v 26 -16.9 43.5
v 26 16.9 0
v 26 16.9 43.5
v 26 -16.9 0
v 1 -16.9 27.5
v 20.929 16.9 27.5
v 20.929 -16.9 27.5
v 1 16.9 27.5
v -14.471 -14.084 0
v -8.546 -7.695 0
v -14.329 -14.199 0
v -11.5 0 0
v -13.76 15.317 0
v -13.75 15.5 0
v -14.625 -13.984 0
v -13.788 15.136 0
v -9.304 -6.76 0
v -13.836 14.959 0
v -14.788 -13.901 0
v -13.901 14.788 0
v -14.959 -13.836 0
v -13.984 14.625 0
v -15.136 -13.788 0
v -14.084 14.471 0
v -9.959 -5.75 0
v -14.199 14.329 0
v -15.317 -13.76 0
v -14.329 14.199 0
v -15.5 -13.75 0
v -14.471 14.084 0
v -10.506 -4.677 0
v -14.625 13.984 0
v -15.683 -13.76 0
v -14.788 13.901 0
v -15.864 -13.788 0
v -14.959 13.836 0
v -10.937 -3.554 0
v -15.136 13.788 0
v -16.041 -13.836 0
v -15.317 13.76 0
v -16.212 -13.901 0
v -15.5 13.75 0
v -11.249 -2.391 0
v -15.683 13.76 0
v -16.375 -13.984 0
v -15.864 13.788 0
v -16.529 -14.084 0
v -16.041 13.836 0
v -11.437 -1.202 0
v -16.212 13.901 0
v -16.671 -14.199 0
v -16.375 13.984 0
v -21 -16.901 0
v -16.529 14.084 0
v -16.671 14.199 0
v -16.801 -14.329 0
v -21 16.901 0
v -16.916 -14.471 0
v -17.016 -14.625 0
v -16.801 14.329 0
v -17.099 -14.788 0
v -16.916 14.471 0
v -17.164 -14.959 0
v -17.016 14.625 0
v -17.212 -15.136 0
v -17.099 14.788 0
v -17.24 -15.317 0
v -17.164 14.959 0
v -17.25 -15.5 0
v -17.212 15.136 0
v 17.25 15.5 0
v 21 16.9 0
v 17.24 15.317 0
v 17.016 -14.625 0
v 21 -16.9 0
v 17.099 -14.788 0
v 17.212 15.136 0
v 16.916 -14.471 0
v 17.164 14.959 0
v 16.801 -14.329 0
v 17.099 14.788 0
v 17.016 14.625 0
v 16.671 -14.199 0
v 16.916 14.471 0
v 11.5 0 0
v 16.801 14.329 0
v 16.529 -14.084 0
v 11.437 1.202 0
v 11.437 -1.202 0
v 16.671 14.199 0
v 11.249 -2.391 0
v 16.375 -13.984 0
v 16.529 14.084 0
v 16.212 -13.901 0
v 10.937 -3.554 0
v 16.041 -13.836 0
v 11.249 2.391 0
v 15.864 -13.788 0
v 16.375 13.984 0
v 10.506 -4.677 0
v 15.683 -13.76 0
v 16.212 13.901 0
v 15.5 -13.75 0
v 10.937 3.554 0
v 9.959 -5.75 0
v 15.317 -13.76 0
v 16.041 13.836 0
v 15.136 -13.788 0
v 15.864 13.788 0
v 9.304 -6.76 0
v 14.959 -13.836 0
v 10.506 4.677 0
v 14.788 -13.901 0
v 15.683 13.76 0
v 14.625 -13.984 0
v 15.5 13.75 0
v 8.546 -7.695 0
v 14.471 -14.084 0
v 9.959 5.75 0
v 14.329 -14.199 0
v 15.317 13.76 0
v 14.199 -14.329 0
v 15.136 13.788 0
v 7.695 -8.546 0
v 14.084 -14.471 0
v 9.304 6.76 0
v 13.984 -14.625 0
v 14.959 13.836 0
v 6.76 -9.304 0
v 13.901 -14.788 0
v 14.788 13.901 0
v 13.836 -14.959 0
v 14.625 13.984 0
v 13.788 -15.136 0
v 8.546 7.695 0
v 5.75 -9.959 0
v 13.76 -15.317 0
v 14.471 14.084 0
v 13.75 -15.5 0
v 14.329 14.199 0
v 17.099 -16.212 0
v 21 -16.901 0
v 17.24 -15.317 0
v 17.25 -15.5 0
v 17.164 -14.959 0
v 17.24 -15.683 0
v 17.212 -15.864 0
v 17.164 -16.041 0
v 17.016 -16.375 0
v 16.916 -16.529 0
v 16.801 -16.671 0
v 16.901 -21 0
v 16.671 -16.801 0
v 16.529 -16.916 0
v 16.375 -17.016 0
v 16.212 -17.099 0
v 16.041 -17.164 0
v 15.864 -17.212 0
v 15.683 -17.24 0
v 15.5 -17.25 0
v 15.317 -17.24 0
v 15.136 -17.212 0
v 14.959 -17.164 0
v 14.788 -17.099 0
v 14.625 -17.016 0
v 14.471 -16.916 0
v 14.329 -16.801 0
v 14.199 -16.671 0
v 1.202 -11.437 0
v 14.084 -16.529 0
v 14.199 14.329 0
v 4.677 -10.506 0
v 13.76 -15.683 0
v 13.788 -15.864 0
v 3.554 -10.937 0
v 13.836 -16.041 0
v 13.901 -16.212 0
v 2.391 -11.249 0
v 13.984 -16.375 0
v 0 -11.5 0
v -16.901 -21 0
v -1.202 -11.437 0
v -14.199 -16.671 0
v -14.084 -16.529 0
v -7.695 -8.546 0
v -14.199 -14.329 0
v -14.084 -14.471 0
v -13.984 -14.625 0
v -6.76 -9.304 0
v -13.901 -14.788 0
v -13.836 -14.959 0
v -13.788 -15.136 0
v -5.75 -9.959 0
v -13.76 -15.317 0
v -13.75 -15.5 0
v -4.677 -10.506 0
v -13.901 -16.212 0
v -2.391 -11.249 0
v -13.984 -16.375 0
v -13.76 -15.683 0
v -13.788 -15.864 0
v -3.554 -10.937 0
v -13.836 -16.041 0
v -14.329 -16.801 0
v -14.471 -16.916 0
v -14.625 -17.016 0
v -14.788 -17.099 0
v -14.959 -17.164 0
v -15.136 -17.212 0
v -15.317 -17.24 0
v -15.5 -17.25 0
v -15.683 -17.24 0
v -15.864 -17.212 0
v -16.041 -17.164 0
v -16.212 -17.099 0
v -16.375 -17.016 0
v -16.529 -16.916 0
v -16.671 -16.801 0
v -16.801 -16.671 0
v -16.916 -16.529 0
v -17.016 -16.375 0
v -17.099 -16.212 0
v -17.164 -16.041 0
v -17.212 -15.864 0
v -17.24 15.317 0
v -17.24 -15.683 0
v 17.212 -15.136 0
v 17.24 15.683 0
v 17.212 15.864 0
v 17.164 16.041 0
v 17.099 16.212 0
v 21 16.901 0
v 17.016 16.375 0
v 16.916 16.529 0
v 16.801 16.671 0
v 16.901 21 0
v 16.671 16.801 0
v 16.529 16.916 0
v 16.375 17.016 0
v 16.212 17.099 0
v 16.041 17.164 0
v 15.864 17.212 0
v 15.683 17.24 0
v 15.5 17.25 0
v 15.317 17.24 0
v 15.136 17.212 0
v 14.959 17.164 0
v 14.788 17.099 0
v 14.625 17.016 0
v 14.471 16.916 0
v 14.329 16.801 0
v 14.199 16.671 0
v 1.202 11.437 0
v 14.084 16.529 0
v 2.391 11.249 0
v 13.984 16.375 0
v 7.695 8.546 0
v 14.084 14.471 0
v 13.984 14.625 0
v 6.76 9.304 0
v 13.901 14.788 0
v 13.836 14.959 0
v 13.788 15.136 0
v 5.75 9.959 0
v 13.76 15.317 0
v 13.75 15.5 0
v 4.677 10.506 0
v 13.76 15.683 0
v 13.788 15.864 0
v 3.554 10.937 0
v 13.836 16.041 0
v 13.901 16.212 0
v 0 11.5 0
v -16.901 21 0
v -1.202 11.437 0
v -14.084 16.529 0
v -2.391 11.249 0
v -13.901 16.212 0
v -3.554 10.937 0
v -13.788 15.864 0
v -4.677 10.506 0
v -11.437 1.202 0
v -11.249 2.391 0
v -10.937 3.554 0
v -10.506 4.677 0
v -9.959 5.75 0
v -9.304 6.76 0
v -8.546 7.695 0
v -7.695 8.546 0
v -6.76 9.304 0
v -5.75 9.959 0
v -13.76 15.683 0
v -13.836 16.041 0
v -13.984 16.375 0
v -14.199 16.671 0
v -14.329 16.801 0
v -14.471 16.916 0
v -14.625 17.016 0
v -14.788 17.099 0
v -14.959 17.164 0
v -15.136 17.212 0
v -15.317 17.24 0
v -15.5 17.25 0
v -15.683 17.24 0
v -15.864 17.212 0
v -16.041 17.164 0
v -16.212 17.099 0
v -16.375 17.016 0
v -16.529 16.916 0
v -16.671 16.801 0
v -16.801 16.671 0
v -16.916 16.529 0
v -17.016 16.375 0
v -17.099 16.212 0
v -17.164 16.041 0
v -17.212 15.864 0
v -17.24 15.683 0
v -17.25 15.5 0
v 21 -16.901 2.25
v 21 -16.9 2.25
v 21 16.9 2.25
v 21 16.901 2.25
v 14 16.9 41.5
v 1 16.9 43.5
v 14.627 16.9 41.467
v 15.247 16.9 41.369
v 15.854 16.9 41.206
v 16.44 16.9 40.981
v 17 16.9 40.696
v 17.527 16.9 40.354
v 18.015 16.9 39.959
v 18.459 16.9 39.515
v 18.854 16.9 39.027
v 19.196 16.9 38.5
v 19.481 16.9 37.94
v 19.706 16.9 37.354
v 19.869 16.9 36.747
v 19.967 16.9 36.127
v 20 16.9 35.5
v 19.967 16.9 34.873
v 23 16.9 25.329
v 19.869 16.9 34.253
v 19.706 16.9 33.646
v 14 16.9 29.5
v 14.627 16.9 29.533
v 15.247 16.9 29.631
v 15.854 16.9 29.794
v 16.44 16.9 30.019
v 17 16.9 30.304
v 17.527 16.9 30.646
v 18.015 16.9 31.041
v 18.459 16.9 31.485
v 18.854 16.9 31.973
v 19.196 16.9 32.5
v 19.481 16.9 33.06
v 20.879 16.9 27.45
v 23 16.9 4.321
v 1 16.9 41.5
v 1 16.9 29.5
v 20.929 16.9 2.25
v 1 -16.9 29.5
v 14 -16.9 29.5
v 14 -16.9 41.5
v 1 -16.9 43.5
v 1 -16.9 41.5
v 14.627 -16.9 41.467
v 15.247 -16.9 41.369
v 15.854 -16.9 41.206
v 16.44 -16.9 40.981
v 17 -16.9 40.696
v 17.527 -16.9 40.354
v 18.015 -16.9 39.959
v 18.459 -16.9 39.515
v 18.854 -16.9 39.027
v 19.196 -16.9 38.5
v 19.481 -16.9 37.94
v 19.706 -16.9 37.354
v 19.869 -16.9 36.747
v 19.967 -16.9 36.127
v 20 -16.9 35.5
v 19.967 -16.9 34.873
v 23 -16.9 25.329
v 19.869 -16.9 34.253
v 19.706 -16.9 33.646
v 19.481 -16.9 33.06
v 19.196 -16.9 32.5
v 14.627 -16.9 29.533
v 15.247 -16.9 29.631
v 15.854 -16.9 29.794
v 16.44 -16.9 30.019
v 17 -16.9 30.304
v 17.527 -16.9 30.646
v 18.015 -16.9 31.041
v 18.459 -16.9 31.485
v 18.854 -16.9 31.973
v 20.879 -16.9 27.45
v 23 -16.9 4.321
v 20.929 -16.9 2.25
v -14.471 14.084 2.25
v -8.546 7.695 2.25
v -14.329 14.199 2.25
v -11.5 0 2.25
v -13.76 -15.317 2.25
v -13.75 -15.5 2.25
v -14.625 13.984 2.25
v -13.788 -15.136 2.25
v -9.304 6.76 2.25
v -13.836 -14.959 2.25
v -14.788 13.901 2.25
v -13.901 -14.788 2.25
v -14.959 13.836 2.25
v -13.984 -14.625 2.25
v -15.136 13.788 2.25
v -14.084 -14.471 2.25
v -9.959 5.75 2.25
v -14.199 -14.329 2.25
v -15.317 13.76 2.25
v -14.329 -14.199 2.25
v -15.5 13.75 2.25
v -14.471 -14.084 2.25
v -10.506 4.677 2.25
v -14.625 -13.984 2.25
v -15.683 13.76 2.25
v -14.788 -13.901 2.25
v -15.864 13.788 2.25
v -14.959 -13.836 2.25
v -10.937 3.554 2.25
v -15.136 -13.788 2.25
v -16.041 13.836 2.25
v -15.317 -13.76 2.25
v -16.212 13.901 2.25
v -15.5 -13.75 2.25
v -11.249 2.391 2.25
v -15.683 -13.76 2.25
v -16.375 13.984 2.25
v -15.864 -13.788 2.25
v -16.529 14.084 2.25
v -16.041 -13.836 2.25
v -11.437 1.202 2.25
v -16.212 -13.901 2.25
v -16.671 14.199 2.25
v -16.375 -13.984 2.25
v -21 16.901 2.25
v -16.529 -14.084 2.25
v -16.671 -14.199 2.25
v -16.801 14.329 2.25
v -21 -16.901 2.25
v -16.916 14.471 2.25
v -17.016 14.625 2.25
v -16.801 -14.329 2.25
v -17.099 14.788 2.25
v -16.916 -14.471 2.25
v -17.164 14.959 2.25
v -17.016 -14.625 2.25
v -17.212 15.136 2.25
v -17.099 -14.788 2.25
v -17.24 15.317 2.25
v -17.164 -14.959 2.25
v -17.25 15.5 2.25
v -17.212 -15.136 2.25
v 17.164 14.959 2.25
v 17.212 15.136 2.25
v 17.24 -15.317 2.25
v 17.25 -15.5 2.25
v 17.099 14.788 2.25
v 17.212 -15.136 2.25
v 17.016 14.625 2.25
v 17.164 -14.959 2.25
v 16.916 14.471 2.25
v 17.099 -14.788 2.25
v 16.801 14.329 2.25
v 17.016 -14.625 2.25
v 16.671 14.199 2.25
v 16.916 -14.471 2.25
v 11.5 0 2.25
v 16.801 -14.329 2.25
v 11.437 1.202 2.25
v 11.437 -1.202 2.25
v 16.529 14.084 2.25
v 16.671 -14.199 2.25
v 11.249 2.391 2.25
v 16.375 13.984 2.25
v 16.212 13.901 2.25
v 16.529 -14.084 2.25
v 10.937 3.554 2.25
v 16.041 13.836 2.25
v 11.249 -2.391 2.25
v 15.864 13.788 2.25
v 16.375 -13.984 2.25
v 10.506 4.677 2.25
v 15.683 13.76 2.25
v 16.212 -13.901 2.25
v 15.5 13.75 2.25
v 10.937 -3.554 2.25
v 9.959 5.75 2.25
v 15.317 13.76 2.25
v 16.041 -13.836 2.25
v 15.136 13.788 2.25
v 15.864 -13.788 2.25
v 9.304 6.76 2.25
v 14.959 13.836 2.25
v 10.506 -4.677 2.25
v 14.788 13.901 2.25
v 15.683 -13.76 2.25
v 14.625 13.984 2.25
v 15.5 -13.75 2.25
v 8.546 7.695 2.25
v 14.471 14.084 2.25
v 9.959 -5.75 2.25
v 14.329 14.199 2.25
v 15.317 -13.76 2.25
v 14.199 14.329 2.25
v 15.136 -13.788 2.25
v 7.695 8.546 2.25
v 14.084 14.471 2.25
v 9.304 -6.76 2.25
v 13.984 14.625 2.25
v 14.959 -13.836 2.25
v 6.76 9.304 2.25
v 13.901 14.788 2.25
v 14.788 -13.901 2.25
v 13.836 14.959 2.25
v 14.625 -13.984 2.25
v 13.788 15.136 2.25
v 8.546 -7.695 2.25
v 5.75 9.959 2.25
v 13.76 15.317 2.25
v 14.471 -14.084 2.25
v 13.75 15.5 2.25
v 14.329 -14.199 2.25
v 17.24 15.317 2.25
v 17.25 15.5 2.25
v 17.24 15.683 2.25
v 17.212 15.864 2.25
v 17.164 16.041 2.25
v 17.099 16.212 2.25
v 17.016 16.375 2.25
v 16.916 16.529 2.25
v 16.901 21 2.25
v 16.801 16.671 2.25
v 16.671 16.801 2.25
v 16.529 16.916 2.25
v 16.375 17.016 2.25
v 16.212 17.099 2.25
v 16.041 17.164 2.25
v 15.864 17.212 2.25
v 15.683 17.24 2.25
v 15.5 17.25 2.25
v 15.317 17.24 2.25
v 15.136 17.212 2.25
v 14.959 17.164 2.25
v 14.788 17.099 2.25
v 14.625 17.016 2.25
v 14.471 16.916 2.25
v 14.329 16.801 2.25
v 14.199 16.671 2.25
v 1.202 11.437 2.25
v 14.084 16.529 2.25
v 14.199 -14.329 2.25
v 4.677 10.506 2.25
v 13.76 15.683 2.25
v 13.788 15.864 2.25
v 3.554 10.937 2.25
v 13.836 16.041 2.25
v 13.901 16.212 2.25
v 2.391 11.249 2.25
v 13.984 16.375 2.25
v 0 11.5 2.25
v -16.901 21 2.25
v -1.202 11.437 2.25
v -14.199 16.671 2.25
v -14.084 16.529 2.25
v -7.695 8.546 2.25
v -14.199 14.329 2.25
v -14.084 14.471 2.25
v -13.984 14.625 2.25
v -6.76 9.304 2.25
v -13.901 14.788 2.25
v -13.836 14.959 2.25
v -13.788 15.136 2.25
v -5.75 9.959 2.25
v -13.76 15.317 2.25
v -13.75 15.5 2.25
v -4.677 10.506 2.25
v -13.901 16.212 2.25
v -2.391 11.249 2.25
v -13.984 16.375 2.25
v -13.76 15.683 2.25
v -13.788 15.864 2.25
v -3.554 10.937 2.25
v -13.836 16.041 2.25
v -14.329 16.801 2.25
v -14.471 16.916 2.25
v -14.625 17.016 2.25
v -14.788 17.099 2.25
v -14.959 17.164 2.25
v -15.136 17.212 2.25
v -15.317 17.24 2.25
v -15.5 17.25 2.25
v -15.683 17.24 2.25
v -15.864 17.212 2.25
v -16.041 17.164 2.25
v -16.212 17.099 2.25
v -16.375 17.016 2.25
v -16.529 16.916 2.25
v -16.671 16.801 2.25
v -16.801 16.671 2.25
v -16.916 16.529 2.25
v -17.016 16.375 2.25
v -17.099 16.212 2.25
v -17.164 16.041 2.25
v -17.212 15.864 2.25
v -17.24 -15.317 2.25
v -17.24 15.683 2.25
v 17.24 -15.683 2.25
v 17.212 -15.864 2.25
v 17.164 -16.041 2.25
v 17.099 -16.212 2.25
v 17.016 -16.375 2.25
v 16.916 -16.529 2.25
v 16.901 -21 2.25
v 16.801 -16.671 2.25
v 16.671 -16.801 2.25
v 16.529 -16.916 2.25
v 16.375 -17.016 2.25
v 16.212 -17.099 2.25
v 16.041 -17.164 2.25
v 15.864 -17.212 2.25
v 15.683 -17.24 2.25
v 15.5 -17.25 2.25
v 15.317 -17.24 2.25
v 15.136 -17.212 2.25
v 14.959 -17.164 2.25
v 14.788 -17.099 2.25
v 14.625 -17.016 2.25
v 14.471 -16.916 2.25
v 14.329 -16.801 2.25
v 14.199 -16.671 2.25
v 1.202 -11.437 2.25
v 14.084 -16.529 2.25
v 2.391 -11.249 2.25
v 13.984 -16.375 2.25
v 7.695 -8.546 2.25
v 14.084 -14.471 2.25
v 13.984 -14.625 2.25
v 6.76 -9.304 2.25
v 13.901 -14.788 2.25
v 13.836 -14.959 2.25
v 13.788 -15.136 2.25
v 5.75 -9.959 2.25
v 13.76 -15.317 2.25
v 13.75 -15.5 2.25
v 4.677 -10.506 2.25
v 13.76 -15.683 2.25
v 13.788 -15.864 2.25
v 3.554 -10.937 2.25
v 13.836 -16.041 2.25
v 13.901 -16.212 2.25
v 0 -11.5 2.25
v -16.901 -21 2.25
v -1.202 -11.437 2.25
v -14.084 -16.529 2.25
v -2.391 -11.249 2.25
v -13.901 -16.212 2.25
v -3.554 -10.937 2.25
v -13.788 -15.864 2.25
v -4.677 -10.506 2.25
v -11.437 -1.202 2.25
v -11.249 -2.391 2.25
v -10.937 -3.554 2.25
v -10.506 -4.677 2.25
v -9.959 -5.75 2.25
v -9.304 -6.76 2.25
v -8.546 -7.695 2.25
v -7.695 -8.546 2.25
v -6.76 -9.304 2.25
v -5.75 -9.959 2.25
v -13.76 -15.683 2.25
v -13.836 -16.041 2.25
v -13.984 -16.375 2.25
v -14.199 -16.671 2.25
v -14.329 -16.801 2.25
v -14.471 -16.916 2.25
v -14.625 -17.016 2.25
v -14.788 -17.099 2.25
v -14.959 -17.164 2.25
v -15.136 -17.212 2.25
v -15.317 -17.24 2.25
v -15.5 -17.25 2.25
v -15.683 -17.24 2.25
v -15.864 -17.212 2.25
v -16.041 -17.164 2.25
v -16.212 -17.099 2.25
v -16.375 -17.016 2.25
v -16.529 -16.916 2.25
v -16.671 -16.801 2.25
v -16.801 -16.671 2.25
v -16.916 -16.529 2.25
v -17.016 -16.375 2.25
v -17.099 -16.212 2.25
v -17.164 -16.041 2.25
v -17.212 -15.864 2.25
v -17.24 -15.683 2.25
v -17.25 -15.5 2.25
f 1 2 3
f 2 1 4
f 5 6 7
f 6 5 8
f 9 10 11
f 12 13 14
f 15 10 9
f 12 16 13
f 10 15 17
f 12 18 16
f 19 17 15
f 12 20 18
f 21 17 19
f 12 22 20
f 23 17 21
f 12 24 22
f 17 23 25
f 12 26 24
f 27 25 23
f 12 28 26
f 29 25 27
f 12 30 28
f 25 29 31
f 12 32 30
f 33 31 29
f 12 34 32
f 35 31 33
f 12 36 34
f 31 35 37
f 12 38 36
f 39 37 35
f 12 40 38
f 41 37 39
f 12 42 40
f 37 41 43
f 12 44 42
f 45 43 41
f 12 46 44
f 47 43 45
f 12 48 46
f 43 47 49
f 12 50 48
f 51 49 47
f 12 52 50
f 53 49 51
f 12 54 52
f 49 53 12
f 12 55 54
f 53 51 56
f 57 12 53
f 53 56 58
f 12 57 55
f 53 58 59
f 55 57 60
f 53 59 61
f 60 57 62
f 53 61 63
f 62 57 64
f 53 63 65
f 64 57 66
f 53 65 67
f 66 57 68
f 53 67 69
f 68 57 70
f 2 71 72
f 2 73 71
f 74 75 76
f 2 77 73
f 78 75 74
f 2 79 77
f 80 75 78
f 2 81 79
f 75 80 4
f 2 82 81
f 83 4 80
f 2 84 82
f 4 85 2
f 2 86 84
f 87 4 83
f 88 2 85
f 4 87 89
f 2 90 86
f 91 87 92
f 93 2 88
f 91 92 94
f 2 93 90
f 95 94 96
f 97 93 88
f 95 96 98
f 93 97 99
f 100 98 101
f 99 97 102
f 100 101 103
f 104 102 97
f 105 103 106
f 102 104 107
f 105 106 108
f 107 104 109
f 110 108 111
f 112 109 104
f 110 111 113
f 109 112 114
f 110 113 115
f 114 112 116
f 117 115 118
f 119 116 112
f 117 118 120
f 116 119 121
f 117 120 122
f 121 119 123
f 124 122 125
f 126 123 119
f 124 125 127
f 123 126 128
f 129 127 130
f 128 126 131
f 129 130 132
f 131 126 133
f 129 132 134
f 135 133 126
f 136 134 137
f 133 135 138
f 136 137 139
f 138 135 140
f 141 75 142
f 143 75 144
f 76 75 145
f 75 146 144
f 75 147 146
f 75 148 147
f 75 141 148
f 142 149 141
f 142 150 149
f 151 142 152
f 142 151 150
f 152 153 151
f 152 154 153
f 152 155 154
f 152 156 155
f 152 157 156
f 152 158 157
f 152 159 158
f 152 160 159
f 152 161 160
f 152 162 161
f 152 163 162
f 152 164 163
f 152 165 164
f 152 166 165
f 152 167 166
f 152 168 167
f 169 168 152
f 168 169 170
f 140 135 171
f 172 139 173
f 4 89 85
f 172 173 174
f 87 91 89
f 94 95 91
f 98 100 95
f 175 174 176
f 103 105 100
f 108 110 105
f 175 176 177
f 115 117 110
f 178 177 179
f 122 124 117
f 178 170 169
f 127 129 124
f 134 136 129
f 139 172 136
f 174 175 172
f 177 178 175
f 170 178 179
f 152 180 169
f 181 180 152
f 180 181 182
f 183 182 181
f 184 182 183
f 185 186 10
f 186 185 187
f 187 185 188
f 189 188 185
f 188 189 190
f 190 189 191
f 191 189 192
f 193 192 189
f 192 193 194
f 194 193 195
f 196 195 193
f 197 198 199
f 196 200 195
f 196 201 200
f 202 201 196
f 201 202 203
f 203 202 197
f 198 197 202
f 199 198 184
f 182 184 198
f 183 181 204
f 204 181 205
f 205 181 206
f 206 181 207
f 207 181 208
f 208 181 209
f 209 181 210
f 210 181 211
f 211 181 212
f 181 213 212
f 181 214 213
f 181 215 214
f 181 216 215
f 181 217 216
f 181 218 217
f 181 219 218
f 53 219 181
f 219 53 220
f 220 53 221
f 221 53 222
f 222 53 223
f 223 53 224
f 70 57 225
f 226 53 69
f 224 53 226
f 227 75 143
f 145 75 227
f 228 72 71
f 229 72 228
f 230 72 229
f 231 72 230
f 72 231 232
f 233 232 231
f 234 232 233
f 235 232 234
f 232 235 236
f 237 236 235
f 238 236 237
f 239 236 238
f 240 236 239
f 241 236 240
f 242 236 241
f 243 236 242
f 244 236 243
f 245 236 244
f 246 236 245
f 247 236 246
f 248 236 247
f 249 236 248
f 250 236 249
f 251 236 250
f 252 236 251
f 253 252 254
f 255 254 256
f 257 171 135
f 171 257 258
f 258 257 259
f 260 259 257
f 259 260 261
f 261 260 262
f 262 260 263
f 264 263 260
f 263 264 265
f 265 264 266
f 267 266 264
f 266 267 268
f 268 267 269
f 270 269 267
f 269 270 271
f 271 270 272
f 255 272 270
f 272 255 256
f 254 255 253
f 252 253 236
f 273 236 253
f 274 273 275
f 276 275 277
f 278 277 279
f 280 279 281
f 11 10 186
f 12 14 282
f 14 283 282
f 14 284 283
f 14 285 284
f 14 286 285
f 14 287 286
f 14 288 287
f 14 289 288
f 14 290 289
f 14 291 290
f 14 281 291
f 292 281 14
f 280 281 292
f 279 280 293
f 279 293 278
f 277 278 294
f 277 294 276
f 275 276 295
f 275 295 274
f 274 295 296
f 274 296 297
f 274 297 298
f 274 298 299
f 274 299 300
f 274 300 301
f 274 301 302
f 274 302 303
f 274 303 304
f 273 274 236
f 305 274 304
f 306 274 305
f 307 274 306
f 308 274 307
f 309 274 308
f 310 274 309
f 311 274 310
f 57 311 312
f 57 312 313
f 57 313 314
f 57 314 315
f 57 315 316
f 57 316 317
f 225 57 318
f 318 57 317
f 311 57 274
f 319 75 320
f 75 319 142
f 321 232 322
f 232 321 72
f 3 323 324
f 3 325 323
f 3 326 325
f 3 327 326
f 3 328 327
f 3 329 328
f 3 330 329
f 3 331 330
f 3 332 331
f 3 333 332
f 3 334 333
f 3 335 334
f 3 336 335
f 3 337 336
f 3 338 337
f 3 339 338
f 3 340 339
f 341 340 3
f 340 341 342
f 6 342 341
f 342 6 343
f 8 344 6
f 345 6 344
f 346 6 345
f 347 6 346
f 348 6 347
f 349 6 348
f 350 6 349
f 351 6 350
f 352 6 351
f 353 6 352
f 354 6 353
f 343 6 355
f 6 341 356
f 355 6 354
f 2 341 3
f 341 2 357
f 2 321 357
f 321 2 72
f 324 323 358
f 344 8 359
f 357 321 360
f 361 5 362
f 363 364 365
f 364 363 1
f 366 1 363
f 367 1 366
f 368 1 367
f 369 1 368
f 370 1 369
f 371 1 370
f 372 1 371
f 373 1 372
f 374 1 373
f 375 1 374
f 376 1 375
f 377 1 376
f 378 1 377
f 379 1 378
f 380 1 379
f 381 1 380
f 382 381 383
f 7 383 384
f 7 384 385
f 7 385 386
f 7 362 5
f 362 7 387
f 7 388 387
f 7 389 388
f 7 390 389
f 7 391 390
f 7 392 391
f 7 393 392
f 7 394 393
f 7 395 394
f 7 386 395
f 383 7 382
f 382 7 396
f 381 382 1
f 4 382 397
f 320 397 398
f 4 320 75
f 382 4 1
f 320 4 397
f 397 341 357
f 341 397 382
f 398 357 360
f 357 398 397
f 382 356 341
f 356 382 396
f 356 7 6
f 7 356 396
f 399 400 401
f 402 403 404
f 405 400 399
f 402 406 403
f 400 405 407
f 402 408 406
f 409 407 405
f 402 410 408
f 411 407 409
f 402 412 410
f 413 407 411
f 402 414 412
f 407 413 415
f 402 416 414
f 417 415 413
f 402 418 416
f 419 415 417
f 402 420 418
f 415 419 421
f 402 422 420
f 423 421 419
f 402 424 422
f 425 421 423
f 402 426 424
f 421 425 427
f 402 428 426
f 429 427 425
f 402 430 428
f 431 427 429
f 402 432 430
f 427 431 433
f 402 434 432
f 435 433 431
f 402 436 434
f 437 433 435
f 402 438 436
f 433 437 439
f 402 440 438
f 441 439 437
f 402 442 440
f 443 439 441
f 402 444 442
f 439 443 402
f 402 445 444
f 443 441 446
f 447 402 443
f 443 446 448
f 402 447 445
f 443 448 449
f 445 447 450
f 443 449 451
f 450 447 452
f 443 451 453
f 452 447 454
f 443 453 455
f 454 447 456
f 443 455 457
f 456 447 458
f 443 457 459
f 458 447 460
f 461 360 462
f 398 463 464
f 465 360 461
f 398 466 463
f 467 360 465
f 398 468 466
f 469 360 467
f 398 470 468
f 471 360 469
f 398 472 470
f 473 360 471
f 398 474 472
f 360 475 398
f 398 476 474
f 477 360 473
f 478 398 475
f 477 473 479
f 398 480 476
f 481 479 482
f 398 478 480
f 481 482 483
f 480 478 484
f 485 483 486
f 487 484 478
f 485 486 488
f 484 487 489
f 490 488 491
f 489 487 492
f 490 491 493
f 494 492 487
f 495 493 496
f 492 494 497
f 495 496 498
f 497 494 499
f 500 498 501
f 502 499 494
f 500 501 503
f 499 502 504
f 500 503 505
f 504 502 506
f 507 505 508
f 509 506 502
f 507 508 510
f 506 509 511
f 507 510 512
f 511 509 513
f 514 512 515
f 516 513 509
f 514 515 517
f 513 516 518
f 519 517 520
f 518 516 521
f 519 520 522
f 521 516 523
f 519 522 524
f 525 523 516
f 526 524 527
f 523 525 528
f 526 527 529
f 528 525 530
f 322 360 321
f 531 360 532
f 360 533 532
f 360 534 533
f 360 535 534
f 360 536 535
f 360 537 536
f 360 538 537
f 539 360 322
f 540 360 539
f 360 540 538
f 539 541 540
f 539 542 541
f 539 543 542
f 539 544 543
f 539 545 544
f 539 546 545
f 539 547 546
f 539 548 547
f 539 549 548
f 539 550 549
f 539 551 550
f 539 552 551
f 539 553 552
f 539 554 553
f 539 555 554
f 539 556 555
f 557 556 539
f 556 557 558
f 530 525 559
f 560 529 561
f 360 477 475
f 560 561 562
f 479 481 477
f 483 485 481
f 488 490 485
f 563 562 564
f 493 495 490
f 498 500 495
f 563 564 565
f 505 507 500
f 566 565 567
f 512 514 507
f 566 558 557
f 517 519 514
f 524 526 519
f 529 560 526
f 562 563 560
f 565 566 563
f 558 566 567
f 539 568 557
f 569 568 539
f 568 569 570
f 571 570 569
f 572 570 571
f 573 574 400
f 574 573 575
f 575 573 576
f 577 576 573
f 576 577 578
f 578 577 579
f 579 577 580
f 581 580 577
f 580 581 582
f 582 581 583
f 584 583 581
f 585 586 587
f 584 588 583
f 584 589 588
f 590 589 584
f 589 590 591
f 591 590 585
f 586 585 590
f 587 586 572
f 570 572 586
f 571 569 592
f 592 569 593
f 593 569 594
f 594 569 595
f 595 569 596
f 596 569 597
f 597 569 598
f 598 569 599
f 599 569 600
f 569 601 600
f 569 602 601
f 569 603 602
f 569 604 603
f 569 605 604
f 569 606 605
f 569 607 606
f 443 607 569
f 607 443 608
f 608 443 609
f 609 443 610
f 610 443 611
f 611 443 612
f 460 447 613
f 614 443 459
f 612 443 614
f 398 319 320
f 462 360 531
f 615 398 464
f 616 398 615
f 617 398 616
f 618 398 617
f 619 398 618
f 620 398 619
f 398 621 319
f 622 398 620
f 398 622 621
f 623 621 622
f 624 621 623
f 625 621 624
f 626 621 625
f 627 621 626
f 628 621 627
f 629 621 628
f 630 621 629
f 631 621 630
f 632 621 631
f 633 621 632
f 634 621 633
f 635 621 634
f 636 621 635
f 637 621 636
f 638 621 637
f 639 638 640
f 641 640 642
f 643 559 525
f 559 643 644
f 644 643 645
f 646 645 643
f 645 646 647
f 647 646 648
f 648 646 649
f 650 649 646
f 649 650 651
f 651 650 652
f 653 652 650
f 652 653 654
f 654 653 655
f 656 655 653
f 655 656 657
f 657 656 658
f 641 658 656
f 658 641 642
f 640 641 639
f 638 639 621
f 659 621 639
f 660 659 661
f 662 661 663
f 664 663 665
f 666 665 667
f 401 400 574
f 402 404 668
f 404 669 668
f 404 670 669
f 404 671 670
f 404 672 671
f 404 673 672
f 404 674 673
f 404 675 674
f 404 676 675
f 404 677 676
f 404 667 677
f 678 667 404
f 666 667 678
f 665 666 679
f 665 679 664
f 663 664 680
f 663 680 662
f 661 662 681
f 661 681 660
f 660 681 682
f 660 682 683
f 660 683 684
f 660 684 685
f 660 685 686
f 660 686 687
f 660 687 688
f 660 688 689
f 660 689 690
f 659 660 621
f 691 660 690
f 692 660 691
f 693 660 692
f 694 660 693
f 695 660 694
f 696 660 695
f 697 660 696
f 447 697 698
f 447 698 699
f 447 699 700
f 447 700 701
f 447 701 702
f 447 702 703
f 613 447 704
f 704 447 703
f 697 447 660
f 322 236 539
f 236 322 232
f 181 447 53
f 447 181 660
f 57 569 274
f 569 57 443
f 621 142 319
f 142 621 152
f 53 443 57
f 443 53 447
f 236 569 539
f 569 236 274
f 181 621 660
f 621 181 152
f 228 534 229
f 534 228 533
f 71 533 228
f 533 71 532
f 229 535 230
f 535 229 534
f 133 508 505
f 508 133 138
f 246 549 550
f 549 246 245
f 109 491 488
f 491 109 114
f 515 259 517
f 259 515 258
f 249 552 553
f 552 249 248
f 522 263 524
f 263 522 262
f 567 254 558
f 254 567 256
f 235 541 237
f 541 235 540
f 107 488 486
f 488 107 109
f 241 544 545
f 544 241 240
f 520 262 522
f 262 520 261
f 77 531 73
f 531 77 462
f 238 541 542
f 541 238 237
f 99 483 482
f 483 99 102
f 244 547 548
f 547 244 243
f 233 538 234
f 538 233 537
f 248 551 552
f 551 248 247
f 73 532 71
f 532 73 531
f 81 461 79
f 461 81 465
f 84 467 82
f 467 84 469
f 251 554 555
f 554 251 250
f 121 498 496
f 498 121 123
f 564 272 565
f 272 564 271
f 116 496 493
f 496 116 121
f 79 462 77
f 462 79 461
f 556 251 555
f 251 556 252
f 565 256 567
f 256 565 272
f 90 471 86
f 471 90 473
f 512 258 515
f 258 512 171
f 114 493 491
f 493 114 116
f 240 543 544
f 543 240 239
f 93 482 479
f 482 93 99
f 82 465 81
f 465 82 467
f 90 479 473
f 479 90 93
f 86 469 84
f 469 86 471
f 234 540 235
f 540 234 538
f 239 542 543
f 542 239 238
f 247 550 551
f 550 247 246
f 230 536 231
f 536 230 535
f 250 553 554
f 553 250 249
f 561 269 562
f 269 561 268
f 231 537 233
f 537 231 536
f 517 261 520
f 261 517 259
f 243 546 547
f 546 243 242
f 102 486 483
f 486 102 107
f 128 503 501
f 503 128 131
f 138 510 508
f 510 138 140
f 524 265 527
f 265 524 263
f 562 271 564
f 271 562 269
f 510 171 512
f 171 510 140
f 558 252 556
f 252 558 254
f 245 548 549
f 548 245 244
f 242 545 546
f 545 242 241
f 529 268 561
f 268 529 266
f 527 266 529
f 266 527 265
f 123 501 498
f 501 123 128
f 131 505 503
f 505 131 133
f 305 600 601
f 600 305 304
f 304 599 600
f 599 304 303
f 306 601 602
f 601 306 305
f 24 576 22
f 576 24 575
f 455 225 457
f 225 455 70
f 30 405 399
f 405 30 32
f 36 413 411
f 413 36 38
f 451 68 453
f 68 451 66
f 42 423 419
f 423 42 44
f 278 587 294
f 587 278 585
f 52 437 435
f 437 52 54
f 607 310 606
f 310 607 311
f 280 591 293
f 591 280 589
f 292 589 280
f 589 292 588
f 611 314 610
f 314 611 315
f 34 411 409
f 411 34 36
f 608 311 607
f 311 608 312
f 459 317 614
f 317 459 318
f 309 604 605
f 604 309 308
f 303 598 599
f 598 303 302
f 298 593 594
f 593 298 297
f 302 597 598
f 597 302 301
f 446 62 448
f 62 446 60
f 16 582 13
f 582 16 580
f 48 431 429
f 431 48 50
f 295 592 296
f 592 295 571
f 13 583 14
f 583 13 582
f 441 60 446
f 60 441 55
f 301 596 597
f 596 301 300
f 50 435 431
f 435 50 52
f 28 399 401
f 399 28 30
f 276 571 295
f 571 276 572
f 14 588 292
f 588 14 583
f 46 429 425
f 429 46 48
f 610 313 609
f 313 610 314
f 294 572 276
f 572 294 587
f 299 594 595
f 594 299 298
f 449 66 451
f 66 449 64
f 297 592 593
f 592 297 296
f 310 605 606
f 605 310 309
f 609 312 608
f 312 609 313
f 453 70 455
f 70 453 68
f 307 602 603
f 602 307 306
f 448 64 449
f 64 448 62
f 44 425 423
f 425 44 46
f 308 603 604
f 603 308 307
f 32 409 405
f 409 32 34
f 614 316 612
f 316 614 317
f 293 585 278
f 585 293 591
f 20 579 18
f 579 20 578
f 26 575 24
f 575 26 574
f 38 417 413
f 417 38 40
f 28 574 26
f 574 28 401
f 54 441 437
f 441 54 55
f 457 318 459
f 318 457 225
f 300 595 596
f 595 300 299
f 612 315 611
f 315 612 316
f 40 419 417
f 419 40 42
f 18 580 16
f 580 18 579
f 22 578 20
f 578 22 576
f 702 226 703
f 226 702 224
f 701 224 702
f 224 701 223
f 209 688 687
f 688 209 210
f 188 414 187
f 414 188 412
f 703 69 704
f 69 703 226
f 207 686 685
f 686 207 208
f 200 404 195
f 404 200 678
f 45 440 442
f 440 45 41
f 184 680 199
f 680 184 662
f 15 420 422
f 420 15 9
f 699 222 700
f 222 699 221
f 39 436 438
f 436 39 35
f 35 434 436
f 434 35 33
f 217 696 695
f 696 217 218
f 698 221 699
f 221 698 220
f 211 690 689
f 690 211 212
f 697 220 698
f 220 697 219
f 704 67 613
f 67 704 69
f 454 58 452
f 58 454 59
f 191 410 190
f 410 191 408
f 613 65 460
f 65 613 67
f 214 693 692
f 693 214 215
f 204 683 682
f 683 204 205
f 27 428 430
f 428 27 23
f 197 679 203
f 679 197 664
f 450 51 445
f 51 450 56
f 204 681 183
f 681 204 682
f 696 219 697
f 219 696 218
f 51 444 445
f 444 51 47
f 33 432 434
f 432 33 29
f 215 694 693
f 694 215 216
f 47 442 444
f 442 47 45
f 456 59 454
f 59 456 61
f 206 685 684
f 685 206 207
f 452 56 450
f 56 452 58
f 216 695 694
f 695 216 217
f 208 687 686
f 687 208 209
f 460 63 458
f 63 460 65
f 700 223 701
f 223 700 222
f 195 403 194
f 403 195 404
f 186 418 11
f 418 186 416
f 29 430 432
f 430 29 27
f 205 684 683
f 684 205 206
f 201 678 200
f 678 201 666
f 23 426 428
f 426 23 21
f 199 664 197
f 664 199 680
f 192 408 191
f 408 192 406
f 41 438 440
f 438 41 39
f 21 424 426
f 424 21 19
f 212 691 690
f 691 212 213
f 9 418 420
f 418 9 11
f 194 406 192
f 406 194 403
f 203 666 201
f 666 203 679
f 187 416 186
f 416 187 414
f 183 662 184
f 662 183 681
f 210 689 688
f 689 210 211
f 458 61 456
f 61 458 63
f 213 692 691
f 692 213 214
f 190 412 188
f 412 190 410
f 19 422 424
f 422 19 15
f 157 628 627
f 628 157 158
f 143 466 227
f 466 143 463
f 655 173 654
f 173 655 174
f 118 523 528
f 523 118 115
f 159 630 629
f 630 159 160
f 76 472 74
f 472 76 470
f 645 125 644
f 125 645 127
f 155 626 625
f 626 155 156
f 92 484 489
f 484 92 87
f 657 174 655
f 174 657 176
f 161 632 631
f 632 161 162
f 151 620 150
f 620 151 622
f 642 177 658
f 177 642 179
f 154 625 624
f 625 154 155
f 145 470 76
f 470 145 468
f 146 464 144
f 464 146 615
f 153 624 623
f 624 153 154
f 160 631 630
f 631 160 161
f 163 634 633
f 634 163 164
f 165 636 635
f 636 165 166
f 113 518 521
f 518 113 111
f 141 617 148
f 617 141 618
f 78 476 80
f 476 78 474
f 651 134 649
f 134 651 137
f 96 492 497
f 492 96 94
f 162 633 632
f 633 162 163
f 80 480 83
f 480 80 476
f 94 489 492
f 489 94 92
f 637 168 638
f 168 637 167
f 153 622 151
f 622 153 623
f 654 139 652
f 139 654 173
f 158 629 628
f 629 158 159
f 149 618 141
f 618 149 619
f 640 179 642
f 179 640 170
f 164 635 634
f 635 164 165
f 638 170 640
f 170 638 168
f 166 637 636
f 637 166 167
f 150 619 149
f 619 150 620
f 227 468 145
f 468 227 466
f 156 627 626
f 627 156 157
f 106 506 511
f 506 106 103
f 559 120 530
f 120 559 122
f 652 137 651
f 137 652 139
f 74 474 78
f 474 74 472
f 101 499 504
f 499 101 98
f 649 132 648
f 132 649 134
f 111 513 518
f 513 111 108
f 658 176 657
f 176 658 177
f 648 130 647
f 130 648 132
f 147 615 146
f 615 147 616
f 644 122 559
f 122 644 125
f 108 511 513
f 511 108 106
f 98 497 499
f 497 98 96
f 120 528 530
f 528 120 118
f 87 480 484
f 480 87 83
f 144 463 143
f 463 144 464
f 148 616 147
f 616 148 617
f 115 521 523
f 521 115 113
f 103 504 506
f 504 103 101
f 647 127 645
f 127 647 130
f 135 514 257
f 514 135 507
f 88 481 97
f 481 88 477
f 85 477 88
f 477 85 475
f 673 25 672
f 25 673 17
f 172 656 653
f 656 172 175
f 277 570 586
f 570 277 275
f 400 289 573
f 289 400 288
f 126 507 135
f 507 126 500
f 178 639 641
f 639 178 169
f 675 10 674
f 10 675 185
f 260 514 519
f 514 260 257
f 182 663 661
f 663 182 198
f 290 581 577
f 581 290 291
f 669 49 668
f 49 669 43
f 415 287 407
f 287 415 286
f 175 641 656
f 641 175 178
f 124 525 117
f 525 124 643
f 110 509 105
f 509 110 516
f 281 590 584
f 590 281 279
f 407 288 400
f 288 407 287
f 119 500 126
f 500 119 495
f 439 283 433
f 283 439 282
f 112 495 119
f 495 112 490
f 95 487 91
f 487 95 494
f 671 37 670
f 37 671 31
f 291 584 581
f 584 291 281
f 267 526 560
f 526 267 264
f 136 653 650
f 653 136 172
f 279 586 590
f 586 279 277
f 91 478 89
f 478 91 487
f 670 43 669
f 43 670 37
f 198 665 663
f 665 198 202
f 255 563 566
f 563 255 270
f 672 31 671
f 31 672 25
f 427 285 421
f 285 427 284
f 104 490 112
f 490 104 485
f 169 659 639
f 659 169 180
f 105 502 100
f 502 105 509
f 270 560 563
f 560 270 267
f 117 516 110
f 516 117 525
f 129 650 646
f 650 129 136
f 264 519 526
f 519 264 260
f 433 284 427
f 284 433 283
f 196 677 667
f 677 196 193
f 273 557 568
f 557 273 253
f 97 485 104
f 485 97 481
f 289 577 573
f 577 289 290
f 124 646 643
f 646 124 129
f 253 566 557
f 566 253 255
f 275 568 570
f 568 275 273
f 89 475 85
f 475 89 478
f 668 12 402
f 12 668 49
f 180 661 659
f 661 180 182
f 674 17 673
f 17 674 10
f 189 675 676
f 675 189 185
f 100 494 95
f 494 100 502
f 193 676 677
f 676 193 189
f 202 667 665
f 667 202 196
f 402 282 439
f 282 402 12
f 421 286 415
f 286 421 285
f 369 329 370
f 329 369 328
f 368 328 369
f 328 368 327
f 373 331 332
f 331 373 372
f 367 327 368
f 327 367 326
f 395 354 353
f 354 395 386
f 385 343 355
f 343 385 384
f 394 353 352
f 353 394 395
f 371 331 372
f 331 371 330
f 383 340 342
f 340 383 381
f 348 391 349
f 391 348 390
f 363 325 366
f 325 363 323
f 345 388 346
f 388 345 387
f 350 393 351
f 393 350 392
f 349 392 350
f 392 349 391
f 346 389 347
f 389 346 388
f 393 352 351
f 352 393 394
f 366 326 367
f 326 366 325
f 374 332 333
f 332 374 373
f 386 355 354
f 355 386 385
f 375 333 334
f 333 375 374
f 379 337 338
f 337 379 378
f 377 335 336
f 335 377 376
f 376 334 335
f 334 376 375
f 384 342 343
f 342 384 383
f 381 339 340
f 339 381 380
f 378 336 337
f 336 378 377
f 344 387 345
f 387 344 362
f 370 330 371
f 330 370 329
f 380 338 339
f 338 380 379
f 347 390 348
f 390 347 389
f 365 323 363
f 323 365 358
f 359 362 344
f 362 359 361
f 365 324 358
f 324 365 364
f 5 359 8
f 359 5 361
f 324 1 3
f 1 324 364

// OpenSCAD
$fn=60; 

$shaftLength=22;
$distanceBetweenHoles=31;
$centerHoleHeight=2.25;
$plateThickness=$centerHoleHeight;
$plateWidth=42;
$plateDepth=$plateWidth;

$gap=$shaftLength+$centerHoleHeight+1;
$bridgeHeight=$plateThickness+$gap;

module motorMountPlate() {
    
    module plate() {
        translate([0,0,$plateThickness/2]) {
            
            intersection() {
                rotate([0,0,45]) {
                    cube([53.6,53.6,$plateThickness], center=true);
                }
                cube([$plateDepth,$plateWidth,$plateThickness], center=true);
            }
        }
    }
    
    module centerHole() {
        $centerHoleDiameter=23;
        
        cylinder(h=$centerHoleHeight+1,d=$centerHoleDiameter);
    }
    
    module screwHoles() {
        module screwHole() {
            translate([$distanceBetweenHoles/2,$distanceBetweenHoles/2,0]) {
                cylinder(d=3.5,h=$plateThickness+1);
            }
        }
        screwHole();
        rotate([0,0,90]) screwHole();
        rotate([0,0,180]) screwHole();
        rotate([0,0,270]) screwHole();
    }
    
    difference() {
        plate();
        centerHole();
        screwHoles();
    }
}

module bridge() {
    module stem() {
        translate([($plateWidth/2)+5/2,0,$bridgeHeight/2]) {
            cube([5,$plateWidth-8.2,$bridgeHeight], center=true);
        }
    }
    
    module clearance() {
        translate([0,-46/2,$plateThickness]) {
            cube([46/2,46,$gap]);
        }
    }
    
    module fillets() {
        translate([23,0,2.2]) {
            rotate([0,45,0]) {
                cube([3,$plateWidth-8.2,3], center=true);
            }
        }
//        
        translate([23,0,2.2+$gap]) {
            rotate([0,45,0]) {
                cube([3,$plateWidth-8.2,3], center=true);
            }
        }
    }
    
    difference() {
        stem();
        clearance();
    }
    
    fillets();
}

module hook() {
    $edgeDiameter=12;
    $edgeRadius=$edgeDiameter/2;
    
    $hookDepth=19;
    $height=25;
    $length=$plateWidth-8.2;
    
    module hookHollow() {
        translate([-($length+2)/2,0,$hookDepth-$edgeRadius]) {
            rotate([0,90,0]) {
                cylinder(d=$edgeDiameter,h=$length+2);
            }
            translate([0,-$edgeRadius,-$hookDepth]) {
                cube([$length+2,$edgeDiameter,$hookDepth]);
            }
        }
    }
    
    module hookBody() {
        translate([0,0,$height/2]) {
            cube([$length,$edgeDiameter+4,$height], center=true);
        }
    }
    
    module hookNotch() {
        translate([-$length/2,-$edgeRadius,$hookDepth-7.5]) {
            rotate([0,90,0]) {
                cylinder(d=3,h=$length);
            }
        }
    }

    difference() {
        hookBody();
        hookHollow();
    }
    
//    hookNotch();
}

bridge();

motorMountPlate();

translate([1,0,$bridgeHeight+8]) {
    rotate([90,0,90]) {
        hook();
    }
}
